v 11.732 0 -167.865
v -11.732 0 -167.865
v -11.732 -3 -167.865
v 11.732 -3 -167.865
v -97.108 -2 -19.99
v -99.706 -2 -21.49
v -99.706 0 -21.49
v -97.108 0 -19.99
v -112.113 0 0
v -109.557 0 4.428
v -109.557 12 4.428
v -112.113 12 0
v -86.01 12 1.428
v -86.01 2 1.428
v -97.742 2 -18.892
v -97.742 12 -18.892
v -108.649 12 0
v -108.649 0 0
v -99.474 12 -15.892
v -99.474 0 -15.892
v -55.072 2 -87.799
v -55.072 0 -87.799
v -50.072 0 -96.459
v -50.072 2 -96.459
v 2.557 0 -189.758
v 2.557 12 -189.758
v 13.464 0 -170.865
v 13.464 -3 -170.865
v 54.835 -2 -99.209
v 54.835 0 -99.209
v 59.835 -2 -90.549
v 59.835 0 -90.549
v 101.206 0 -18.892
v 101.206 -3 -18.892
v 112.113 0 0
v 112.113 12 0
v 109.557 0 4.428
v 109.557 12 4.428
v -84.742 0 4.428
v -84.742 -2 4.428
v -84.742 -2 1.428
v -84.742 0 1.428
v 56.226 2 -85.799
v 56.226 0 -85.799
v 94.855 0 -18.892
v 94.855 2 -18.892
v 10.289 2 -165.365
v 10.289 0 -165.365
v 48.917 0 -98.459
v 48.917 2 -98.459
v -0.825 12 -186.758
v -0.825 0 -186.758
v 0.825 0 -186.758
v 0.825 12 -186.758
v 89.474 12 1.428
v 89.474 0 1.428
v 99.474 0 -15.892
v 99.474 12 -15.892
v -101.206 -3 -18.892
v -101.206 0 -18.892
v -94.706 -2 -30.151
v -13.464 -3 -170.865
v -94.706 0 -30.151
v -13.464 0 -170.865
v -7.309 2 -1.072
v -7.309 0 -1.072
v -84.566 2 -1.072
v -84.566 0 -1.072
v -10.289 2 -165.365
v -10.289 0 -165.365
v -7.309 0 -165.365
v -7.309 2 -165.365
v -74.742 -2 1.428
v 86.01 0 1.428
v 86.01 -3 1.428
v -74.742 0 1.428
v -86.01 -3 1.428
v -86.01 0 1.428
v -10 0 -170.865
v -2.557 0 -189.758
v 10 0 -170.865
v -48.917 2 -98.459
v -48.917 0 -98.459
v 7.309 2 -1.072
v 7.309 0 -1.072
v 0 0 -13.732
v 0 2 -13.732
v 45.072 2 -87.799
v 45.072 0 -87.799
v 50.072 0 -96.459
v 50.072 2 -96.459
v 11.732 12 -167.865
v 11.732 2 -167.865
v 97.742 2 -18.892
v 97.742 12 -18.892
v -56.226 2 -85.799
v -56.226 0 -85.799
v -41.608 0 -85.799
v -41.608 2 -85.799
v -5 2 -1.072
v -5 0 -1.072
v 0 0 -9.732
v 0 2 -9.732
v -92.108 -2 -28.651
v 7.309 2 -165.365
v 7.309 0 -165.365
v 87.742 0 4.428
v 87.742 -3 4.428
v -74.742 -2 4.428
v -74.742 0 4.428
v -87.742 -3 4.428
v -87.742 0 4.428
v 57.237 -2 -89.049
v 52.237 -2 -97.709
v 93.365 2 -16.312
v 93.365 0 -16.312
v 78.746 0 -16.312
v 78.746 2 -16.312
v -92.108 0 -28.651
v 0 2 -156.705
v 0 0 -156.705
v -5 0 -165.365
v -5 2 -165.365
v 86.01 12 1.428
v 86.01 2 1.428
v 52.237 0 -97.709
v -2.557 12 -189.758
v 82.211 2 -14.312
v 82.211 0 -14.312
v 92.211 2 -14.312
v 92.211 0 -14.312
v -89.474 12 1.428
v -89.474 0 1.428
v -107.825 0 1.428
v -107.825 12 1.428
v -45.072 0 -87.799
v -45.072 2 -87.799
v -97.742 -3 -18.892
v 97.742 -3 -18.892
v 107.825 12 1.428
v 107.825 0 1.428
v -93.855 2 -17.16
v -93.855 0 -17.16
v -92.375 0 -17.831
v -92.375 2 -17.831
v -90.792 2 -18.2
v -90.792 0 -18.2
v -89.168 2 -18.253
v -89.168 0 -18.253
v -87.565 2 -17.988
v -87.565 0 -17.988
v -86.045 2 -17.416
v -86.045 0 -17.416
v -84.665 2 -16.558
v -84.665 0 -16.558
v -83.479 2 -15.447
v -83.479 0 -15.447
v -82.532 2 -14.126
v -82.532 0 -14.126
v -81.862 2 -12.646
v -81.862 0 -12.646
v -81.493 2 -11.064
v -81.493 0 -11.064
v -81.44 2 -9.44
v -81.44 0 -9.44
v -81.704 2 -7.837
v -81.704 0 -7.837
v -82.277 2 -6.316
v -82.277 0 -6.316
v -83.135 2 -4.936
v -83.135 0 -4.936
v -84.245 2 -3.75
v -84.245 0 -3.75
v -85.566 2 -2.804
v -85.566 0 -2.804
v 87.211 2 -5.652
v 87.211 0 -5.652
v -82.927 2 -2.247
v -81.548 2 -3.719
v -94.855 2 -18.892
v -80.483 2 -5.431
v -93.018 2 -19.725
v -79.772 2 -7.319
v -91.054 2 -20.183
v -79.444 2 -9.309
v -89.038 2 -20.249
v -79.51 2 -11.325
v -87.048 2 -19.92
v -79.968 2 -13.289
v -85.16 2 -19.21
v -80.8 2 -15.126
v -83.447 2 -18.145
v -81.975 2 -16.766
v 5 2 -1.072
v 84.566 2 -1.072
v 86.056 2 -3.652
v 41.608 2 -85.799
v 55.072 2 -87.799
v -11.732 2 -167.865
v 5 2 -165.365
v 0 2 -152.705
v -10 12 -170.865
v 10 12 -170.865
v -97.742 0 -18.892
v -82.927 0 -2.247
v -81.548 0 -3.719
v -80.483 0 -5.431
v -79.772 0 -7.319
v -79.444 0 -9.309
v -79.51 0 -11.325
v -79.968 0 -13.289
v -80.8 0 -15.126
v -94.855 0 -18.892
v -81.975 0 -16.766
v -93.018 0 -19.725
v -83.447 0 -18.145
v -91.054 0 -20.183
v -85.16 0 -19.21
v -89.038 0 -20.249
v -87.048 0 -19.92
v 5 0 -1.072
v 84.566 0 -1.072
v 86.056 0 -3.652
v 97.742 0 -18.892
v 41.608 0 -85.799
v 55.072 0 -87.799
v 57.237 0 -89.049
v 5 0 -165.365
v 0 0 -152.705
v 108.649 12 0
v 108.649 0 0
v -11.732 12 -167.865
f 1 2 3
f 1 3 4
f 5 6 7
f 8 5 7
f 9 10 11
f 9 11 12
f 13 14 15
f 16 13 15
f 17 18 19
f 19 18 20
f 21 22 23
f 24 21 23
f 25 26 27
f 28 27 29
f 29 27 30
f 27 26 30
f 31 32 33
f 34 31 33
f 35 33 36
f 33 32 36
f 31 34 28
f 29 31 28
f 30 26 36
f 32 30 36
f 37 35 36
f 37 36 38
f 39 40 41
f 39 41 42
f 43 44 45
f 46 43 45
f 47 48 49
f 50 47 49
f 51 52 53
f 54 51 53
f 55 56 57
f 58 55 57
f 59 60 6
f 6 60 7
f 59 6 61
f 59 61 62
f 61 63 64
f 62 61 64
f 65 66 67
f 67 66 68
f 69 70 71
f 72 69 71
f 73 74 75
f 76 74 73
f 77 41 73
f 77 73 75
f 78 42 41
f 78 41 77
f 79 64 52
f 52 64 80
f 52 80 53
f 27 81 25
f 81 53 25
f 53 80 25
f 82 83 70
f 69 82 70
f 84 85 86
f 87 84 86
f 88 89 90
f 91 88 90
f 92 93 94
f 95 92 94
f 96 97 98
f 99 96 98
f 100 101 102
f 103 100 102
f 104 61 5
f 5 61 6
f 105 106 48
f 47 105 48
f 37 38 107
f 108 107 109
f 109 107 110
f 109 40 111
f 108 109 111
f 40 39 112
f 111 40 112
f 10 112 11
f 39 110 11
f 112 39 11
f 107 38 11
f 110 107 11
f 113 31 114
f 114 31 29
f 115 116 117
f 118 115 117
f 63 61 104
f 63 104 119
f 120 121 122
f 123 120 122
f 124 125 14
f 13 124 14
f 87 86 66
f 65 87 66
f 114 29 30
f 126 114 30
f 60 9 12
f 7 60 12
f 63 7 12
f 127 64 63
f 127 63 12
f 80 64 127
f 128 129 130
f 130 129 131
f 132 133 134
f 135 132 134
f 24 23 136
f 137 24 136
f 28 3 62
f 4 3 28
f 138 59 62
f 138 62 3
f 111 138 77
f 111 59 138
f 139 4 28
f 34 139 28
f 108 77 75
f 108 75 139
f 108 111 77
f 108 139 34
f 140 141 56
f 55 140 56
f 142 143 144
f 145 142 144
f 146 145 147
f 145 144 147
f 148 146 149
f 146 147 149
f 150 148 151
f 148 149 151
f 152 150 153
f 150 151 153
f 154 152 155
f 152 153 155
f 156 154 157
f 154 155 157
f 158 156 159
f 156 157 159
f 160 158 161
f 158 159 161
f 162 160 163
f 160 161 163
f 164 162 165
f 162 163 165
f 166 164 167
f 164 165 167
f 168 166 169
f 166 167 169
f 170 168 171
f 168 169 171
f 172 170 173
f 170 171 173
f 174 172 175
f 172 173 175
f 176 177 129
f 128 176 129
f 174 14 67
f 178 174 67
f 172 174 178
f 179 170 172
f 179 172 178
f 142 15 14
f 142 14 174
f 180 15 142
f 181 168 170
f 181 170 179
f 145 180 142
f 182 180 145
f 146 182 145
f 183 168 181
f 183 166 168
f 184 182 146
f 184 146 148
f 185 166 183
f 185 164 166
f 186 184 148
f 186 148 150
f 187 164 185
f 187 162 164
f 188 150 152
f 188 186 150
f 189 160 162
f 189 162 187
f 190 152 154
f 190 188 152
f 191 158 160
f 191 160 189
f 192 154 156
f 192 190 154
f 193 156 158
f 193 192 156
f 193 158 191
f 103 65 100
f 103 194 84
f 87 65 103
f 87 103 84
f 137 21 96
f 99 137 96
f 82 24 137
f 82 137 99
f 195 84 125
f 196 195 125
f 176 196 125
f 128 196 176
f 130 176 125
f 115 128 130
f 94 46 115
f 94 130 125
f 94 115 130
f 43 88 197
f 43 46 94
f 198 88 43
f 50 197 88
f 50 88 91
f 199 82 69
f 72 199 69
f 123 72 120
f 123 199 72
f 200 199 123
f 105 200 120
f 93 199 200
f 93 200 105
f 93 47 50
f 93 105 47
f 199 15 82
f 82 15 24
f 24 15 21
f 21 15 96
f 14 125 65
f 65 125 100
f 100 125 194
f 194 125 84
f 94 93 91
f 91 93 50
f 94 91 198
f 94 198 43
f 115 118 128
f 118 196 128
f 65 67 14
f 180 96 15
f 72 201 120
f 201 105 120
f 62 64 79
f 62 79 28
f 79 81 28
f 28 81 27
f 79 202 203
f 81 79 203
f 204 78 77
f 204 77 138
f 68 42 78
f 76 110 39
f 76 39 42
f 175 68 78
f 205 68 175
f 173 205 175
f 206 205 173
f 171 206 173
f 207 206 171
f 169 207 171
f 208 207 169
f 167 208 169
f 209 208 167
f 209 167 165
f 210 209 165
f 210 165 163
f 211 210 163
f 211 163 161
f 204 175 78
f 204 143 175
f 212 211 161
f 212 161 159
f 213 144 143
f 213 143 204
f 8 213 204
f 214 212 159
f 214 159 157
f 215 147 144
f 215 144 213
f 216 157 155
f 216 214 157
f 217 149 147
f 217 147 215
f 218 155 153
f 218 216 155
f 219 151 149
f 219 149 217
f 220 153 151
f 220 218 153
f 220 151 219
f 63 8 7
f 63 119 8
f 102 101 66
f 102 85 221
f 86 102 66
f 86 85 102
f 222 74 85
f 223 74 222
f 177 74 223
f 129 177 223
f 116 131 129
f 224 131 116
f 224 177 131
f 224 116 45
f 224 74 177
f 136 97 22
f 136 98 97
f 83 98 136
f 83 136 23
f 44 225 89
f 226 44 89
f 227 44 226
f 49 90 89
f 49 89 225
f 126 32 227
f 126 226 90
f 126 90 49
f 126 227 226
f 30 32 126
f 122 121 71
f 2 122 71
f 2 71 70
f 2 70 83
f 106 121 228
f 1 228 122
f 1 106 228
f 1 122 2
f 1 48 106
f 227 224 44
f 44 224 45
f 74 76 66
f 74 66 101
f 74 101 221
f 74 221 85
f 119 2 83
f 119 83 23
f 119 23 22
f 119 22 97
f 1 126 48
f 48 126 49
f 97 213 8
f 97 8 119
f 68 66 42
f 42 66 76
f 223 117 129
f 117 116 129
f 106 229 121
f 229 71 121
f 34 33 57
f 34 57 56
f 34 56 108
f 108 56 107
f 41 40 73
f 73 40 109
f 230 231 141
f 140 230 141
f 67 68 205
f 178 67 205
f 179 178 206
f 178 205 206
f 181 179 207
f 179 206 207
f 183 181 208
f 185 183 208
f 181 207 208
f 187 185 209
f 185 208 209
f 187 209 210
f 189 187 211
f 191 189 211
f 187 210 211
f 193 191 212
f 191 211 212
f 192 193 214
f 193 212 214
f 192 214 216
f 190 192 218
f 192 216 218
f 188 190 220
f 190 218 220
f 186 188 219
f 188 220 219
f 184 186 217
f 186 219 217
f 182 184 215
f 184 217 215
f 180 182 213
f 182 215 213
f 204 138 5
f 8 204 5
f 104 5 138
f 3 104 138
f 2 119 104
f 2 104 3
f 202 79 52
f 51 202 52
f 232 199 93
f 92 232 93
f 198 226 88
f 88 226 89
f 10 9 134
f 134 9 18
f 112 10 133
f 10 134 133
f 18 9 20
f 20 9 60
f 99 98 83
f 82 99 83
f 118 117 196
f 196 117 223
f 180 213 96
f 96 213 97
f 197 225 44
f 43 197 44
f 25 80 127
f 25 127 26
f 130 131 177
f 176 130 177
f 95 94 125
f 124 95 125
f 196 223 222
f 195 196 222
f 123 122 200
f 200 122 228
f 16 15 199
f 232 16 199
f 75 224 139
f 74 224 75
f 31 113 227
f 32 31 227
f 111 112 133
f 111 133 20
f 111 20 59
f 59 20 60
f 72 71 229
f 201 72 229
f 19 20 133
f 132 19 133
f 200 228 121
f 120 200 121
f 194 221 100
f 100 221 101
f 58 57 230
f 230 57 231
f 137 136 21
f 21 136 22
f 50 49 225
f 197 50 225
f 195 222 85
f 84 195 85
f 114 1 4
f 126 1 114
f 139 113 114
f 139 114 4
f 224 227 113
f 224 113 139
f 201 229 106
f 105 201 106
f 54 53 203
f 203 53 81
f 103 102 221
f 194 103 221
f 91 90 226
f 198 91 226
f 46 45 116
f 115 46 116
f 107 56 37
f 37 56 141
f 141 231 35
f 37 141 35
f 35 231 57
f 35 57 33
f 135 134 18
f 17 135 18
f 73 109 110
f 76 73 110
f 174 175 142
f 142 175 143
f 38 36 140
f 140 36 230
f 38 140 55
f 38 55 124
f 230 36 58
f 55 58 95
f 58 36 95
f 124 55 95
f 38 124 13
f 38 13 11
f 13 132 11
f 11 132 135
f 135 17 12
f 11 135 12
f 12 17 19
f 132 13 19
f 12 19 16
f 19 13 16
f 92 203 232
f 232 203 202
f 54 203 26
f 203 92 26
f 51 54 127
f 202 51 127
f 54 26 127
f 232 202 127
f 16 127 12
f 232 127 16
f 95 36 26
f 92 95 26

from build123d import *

# Parameters (mm, degrees)
BOSS_EXTRUDE1_DEPTH = 12
BOSS_EXTRUDE2_DEPTH = 2
BOSS_EXTRUDE3_DEPTH = 3
SKETCH4_W           = 10
SKETCH4_H           = 2
CUT_EXTRUDE1_DEPTH  = 6
SKETCH5_W           = 10
SKETCH5_H           = 2
CUT_EXTRUDE2_DEPTH  = 6
SKETCH6_W           = 10
SKETCH6_H           = 2
CUT_EXTRUDE3_DEPTH  = 6


with BuildPart() as part:
    # Sketch1 → Boss-Extrude1 (new body)
    with BuildSketch(Plane(origin=(0, 0, 0), x_dir=(1, 0, 0), z_dir=(0, 1, 0))):
        Polygon((109.556624327, -4.42820323), (-109.556624327, -4.42820323), (-112.113248654, 0), (-2.55662435, 189.757639654), (2.556624303, 189.757639654), (112.113248654, 0), align=None)
        Polygon((-107.82457352, -1.42820323), (-108.649147039, 0), (-99.473720558, 15.892304845), (-89.473720559, -1.42820323), align=None, mode=Mode.SUBTRACT)
        Polygon((-0.824573543, 186.757639627), (0.824573481, 186.757639627), (9.999999979, 170.86533478), (-10.000000021, 170.86533478), align=None, mode=Mode.SUBTRACT)
        Polygon((108.649147039, 0), (107.82457353, -1.428203222), (89.473720569, -1.428203222), (99.473720569, 15.892304853), align=None, mode=Mode.SUBTRACT)
        Polygon((-11.732050803, 167.865334802), (11.732050803, 167.865334802), (97.741669765, 18.89230486), (86.00961895, -1.428203229), (-86.009618944, -1.428203229), (-97.741669751, 18.892304845), align=None, mode=Mode.SUBTRACT)
    extrude(amount=BOSS_EXTRUDE1_DEPTH)

    # Sketch1<4> → Boss-Extrude2 (add)
    with BuildSketch(Plane(origin=(0, 0, 0), x_dir=(1, 0, 0), z_dir=(0, 1, 0))):
        Polygon((11.732050803, 167.865334802), (-11.732050803, 167.865334802), (-97.741669751, 18.892304845), (-86.009618944, -1.428203229), (86.00961895, -1.428203229), (97.741669765, 18.89230486), align=None)
        with BuildLine():
            Line((-85.566243251, 2.803847594), (-93.854918378, 17.160254041))
            ThreePointArc((-93.854918378, 17.160254041), (-82.532377591, 14.126388381), (-85.566243251, 2.803847594))
        make_face(mode=Mode.SUBTRACT)
        Polygon((-1e-08, 9.732050841), (4.99999999, 1.071796803), (-5.00000001, 1.071796803), align=None, mode=Mode.SUBTRACT)
        Polygon((-45.071796745, 87.798692801), (-55.071796745, 87.798692801), (-50.071796745, 96.458946839), align=None, mode=Mode.SUBTRACT)
        Polygon((82.210580848, 14.312177834), (92.210580848, 14.312177834), (87.210580848, 5.651923796), align=None, mode=Mode.SUBTRACT)
        with BuildLine():
            Line((48.91709624, 98.458946834), (41.607695163, 85.798692796))
            Line((41.607695163, 85.798692796), (56.226497316, 85.798692796))
            Line((56.226497316, 85.798692796), (94.854918412, 18.892304841))
            Line((94.854918412, 18.892304841), (93.36528139, 16.312177834))
            Line((93.36528139, 16.312177834), (78.746479233, 16.312177834))
            Line((78.746479233, 16.312177834), (86.055880312, 3.651923793))
            Line((86.055880312, 3.651923793), (84.566243293, 1.071796793))
            Line((84.566243293, 1.071796793), (7.309401088, 1.071796793))
            Line((7.309401088, 1.071796793), (2e-09, 13.732050847))
            Line((2e-09, 13.732050847), (-7.309401077, 1.071796786))
            Line((-7.309401077, 1.071796786), (-84.566243251, 1.071796786))
            ThreePointArc((-84.566243251, 1.071796786), (-80.800326783, 15.126388381), (-94.854918378, 18.892304849))
            Line((-94.854918378, 18.892304849), (-56.226497283, 85.798692801))
            Line((-56.226497283, 85.798692801), (-41.60769513, 85.798692801))
            Line((-41.60769513, 85.798692801), (-48.917096207, 98.458946839))
            Line((-48.917096207, 98.458946839), (-10.288675112, 165.365334792))
            Line((-10.288675112, 165.365334792), (-7.309401077, 165.365334792))
            Line((-7.309401077, 165.365334792), (0, 152.705080754))
            Line((0, 152.705080754), (7.309401077, 165.365334792))
            Line((7.309401077, 165.365334792), (10.288675142, 165.365334792))
            Line((10.288675142, 165.365334792), (48.91709624, 98.458946834))
        make_face(mode=Mode.SUBTRACT)
        Polygon((45.071796778, 87.798692803), (50.071796778, 96.458946841), (55.071796778, 87.798692803), align=None, mode=Mode.SUBTRACT)
        Polygon((0, 156.705080761), (-5, 165.365334799), (5, 165.365334799), align=None, mode=Mode.SUBTRACT)
    extrude(amount=BOSS_EXTRUDE2_DEPTH)

    # Sketch2 → Boss-Extrude3 (add)
    with BuildSketch(Plane.XZ):
        Polygon((101.205771363, -18.892304847), (87.741669751, 4.42820323), (-87.741669751, 4.42820323), (-101.205771368, -18.892304847), (-13.464101652, -170.86533478), (13.464101609, -170.86533478), align=None)
        Polygon((-11.732050819, -167.865334802), (11.732050795, -167.865334802), (97.741669739, -18.892304852), (86.009618931, 1.42820323), (-86.009618931, 1.42820323), (-97.741669763, -18.892304852), align=None, mode=Mode.SUBTRACT)
    extrude(amount=BOSS_EXTRUDE3_DEPTH)

    # Sketch4 → Cut-Extrude1 (cut)
    with BuildSketch(Plane.XY.offset(4.42820323)):
        with Locations((-79.741669751, -1)):
            Rectangle(SKETCH4_W, SKETCH4_H)
    extrude(amount=-CUT_EXTRUDE1_DEPTH, mode=Mode.SUBTRACT)

    # Sketch5 → Cut-Extrude2 (cut)
    with BuildSketch(Plane(origin=(-84.084936503, 0, -48.546460711), x_dir=(-0.4999999998935114, 0, 0.86602540384592), z_dir=(-0.86602540384592, 0, -0.4999999998935114))):
        with Locations((26.241669739, -1)):
            Rectangle(SKETCH5_W, SKETCH5_H)
    extrude(amount=-CUT_EXTRUDE2_DEPTH, mode=Mode.SUBTRACT)

    # Sketch6 → Cut-Extrude3 (cut)
    with BuildSketch(Plane(origin=(84.084936484, 0, -48.546460721), x_dir=(-0.5000000000540236, 0, -0.8660254037532481), z_dir=(0.8660254037532481, 0, -0.5000000000540236))):
        with Locations((53.499999991, -1)):
            Rectangle(SKETCH6_W, SKETCH6_H)
    extrude(amount=-CUT_EXTRUDE3_DEPTH, mode=Mode.SUBTRACT)


solid = part.part
